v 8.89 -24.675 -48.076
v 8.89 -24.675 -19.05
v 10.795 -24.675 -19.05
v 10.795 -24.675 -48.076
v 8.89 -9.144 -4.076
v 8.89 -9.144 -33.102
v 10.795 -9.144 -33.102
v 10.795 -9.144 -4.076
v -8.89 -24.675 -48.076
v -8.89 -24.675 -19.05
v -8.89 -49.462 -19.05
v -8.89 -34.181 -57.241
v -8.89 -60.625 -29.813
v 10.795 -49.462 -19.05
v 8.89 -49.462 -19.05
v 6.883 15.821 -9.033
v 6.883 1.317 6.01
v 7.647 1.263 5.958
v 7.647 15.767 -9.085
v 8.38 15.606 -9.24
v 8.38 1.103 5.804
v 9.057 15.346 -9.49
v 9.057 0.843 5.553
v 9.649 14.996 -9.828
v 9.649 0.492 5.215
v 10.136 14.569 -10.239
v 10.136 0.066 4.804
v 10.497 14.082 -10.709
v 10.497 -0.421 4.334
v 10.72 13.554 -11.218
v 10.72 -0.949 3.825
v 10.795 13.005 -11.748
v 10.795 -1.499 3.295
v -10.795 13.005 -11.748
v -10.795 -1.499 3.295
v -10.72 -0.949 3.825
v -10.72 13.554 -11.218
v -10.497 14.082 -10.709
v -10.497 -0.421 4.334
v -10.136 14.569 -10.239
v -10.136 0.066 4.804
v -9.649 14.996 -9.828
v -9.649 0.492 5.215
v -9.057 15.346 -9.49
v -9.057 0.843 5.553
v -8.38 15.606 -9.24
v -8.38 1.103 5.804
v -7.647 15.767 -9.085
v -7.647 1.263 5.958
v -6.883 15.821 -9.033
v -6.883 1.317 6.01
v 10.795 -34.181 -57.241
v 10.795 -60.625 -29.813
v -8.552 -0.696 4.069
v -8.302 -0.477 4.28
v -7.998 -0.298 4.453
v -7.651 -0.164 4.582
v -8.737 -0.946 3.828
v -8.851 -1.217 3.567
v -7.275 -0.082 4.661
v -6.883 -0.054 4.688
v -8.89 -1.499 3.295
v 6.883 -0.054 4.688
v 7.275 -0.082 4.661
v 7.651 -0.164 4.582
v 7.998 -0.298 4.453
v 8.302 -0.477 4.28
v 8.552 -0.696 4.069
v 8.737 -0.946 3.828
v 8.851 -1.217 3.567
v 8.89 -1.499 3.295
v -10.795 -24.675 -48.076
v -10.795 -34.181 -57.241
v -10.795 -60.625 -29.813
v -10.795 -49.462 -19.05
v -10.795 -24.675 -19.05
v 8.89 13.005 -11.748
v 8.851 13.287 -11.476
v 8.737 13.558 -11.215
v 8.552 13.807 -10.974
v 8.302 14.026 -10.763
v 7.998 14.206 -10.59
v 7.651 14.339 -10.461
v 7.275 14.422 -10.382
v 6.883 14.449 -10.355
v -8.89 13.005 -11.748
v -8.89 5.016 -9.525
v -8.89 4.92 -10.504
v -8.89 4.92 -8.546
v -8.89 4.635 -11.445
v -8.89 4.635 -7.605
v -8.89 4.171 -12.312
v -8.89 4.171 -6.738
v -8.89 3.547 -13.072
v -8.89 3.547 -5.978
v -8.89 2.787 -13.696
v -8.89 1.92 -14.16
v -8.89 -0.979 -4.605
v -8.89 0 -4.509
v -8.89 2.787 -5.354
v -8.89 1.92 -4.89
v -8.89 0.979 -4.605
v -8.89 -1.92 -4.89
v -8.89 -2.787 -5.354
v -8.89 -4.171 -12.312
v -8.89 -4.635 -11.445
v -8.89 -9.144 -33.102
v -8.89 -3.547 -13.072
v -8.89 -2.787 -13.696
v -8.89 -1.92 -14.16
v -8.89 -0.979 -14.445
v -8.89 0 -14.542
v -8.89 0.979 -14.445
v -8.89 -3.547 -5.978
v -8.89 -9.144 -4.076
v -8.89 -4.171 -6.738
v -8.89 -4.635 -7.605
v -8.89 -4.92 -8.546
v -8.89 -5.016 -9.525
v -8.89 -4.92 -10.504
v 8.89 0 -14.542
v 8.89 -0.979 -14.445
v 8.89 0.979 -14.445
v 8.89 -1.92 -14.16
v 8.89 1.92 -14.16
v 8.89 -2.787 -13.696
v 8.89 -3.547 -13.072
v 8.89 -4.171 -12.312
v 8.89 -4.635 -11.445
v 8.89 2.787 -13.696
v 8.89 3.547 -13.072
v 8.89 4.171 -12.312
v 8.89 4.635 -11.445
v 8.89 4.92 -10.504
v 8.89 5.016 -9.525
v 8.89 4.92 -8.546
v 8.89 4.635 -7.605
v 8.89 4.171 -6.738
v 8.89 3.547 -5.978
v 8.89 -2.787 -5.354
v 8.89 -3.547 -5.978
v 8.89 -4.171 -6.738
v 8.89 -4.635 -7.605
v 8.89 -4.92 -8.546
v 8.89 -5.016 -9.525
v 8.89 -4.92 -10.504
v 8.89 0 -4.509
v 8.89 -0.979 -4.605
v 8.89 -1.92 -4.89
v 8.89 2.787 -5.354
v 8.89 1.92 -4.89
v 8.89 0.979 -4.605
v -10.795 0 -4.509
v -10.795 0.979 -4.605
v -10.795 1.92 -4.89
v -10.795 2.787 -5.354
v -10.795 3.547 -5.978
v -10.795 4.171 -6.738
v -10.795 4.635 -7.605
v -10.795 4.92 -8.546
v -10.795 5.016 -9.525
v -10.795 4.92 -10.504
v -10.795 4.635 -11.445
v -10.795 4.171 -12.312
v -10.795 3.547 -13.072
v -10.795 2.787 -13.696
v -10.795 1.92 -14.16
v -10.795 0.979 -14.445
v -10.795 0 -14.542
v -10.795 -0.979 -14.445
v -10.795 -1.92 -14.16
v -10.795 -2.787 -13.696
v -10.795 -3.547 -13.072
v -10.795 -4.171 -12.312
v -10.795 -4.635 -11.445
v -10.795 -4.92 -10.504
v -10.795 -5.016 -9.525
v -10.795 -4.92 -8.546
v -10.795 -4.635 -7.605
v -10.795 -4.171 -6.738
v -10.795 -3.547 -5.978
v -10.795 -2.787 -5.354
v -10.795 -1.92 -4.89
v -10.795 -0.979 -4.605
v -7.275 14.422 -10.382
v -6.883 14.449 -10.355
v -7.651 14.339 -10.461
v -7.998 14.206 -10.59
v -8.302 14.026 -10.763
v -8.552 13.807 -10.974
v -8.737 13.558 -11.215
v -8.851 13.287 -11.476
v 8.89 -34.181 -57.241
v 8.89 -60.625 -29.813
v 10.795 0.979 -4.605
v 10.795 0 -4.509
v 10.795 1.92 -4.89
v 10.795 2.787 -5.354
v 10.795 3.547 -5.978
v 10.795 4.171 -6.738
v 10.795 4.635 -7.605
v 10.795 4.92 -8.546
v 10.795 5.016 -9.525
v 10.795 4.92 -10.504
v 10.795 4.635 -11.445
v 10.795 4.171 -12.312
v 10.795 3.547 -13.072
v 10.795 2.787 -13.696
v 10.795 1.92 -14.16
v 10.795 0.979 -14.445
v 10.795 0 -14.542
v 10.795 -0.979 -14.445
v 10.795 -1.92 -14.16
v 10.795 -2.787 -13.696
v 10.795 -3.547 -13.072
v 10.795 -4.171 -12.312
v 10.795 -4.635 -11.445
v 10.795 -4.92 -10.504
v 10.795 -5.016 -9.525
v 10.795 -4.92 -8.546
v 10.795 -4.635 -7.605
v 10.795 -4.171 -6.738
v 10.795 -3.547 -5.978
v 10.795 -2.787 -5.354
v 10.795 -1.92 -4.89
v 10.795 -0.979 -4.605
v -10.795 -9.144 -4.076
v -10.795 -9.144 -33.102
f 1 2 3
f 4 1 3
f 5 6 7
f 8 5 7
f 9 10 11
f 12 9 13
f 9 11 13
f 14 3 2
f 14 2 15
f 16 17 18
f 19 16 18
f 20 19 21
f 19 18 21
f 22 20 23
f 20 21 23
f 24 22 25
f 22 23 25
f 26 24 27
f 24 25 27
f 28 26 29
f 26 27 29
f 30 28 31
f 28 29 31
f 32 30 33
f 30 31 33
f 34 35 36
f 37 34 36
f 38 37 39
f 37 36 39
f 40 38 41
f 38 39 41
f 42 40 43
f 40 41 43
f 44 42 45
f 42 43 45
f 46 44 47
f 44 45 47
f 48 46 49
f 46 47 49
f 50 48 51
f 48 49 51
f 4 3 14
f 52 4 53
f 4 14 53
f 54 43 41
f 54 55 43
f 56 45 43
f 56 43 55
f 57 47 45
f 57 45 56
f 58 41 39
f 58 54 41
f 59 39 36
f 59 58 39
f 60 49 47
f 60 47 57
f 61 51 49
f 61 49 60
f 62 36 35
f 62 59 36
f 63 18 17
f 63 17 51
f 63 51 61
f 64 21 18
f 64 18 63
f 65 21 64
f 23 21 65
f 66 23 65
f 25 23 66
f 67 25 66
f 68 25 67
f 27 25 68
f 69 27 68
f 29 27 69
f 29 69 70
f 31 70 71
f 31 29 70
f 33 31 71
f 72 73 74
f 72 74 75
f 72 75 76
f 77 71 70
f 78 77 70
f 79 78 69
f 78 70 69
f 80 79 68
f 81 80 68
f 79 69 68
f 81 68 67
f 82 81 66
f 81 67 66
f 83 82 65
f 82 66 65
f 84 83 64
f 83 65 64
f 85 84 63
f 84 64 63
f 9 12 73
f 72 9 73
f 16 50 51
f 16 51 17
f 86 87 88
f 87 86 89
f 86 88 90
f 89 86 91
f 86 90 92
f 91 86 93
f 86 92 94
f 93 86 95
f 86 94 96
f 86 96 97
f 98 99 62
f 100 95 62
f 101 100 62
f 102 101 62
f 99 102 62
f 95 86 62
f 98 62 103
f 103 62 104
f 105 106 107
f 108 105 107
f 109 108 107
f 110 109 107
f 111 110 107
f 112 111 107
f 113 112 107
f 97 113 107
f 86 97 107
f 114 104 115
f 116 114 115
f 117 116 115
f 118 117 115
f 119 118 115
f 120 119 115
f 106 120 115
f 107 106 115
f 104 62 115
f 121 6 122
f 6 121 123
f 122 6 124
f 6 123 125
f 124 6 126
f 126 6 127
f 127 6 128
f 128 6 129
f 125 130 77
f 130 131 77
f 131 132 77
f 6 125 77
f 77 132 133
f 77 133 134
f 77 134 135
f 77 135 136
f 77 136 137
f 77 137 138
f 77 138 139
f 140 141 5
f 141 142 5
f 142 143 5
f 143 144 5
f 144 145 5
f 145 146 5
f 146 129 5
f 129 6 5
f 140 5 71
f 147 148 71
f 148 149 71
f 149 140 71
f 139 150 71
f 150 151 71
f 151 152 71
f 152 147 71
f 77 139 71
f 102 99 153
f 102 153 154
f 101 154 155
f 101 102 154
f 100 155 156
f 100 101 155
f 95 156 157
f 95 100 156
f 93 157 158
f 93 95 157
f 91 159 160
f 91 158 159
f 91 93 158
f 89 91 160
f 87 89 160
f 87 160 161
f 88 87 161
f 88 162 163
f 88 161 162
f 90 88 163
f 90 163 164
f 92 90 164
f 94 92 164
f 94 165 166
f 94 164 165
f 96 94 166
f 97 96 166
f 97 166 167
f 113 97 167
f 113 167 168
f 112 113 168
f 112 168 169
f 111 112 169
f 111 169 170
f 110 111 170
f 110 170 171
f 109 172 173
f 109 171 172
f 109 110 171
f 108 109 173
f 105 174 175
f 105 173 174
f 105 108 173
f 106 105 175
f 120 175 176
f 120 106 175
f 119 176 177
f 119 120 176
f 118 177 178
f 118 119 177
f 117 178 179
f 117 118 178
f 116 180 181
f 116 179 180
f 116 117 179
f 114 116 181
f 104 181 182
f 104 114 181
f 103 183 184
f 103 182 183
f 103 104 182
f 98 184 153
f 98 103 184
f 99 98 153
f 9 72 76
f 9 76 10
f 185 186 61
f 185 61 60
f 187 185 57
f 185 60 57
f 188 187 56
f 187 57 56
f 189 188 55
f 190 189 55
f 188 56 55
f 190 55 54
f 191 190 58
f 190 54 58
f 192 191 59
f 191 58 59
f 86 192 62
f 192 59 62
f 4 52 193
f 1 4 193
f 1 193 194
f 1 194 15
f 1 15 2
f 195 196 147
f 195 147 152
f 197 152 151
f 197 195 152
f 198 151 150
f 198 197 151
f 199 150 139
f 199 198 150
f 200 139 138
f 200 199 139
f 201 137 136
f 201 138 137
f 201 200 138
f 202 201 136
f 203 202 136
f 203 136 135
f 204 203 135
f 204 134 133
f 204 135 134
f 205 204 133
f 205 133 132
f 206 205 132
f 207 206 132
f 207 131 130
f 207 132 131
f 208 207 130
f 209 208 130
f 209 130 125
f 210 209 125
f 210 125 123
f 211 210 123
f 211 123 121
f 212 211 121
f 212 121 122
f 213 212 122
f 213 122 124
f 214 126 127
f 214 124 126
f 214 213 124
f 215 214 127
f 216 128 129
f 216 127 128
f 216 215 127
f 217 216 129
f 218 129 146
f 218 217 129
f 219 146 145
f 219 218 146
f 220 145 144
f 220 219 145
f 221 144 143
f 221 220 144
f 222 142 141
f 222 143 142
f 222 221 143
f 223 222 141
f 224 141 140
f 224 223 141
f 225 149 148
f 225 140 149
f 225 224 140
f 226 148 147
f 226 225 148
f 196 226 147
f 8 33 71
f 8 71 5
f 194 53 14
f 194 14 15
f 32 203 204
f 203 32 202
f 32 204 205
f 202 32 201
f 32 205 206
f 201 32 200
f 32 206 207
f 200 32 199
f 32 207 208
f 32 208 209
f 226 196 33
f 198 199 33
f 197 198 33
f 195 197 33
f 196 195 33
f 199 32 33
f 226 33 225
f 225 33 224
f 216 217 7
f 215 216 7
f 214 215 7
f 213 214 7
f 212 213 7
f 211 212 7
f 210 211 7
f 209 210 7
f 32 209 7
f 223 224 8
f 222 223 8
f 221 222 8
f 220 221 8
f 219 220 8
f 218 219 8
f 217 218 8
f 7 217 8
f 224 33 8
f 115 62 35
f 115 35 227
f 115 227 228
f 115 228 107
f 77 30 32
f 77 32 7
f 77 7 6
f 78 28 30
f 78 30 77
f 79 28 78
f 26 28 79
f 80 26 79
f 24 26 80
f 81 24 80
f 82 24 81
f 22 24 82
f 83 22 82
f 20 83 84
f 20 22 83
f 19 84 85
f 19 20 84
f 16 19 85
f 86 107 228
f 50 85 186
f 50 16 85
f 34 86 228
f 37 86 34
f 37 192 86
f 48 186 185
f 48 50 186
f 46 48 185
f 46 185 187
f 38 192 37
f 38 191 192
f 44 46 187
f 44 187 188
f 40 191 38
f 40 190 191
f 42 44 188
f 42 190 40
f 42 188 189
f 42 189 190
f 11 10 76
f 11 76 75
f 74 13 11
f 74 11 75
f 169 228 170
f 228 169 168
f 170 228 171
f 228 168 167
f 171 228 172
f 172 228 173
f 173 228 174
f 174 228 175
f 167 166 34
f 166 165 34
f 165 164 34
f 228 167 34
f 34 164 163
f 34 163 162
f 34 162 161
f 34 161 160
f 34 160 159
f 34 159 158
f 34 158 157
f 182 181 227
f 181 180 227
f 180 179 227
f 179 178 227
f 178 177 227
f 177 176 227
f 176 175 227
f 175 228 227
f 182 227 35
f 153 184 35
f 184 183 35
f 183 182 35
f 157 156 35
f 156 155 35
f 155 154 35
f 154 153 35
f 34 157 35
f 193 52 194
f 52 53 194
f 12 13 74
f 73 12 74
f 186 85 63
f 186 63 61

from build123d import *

# Parameters (mm, degrees)
BASE_FLANGE1_DEPTH      = 19.05
CUT_EXTRUDE1_START      = -21.59
CUT_EXTRUDE1_DEPTH      = 21.59
CUT_EXTRUDE2_DEPTH      = 87.128405868
CUT_EXTRUDE2_DEPTH_BACK = 87.128405868
CUT_EXTRUDE3_DEPTH      = 86.670726753
CUT_EXTRUDE3_DEPTH_BACK = 86.670726753
SKETCH9_R               = 5.0165
CUT_EXTRUDE6_DEPTH      = 86.058030225
CUT_EXTRUDE6_DEPTH_BACK = 86.058030225
SKETCH10_W              = 21.59
SKETCH10_H              = 15.531347002


# Read off the part's stored shape, not the designer's step: Cut-Extrude1
# Sheet-metal steps are written as plain solids
with BuildPart() as part:
    # Sketch1 → Base-Flange1 (new, symmetric)
    with BuildSketch(Plane(origin=(0, -0.842343472, 1.363693041), x_dir=(1, 0, 0), z_dir=(0, -0.6940771264425077, 0.7199006476933545))):
        with BuildLine():
            Line((-10.795, -64.676760458), (-10.795, 0.868157815))
            ThreePointArc((-10.795, 0.868157815), (-9.649318885, 3.6340767), (-6.8834, 4.779757815))
            Line((-6.8834, 4.779757815), (6.8834, 4.779757815))
            ThreePointArc((6.8834, 4.779757815), (9.649318885, 3.6340767), (10.795, 0.868157815))
            Line((10.795, 0.868157815), (10.795, -64.676760458))
            Line((10.795, -64.676760458), (8.89, -64.676760458))
            Line((8.89, -64.676760458), (8.89, 0.868157815))
            ThreePointArc((8.89, 0.868157815), (8.302280467, 2.287038282), (6.8834, 2.874757815))
            Line((6.8834, 2.874757815), (-6.8834, 2.874757815))
            ThreePointArc((-6.8834, 2.874757815), (-8.302280467, 2.287038282), (-8.89, 0.868157815))
            Line((-8.89, 0.868157815), (-8.89, -64.676760458))
            Line((-8.89, -64.676760458), (-10.795, -64.676760458))
        make_face()
    extrude(amount=BASE_FLANGE1_DEPTH, both=True)

    # Cut-Extrude1 outline → Cut-Extrude1 (cut)
    with BuildSketch(Plane.ZY.offset(10.795).offset(CUT_EXTRUDE1_START)):
        Polygon((3.295278576, -1.498700046), (-19.05, -24.675347002), (-19.05, -49.462056695), (15.680368861, -13.439525358), (18.395320949, -10.623561984), (6.010230664, 1.317263328), align=None)
    extrude(amount=CUT_EXTRUDE1_DEPTH, mode=Mode.SUBTRACT)

    # Sketch7 → Cut-Extrude2 (cut, two sides: drawn at the far end of the back side and taken through both)
    with BuildSketch(Plane.ZY.offset(10.795).offset(-CUT_EXTRUDE2_DEPTH_BACK)):
        Polygon((11.882741933, -6.055059051), (9.429090908, -1.978959147), (12.655449119, -0.036819034), (15.109100144, -4.112918938), align=None)
    extrude(amount=CUT_EXTRUDE2_DEPTH + CUT_EXTRUDE2_DEPTH_BACK, mode=Mode.SUBTRACT)

    # Sketch9 → Cut-Extrude3 (cut, two sides: drawn at the far end of the back side and taken through both)
    with BuildSketch(Plane.ZY.offset(-8.89).offset(-CUT_EXTRUDE3_DEPTH_BACK)):
        with Locations((-9.525, 0)):
            Circle(SKETCH9_R)
    extrude(amount=CUT_EXTRUDE3_DEPTH + CUT_EXTRUDE3_DEPTH_BACK, mode=Mode.SUBTRACT)

    # Sketch10 → Cut-Extrude6 (cut, two sides: drawn at the far end of the back side and taken through both)
    with BuildSketch(Plane.XY.offset(1.435180439).offset(-CUT_EXTRUDE6_DEPTH_BACK)):
        with Locations((0, -16.909673501)):
            Rectangle(SKETCH10_W, SKETCH10_H)
    extrude(amount=CUT_EXTRUDE6_DEPTH + CUT_EXTRUDE6_DEPTH_BACK, mode=Mode.SUBTRACT)


with BuildPart() as cut_extrude6_piece_1:
    # of the separate pieces the step leaves, piece 1, a body of its own (cut_extrude6_pieces)
    add(part.part.solids().sort_by_distance((-10.795, -9.144, -33.102159972))[0])


with BuildPart() as cut_extrude6_piece_2:
    # of the separate pieces the step leaves, piece 2, a body of its own (cut_extrude6_pieces)
    add(part.part.solids().sort_by_distance((-10.795, -34.181015958, -57.241074344))[0])


with BuildPart() as cut_extrude6_piece_3:
    # of the separate pieces the step leaves, piece 3, a body of its own (cut_extrude6_pieces)
    add(part.part.solids().sort_by_distance((10.795, -24.675347002, -48.076382778))[0])


solid = Compound([cut_extrude6_piece_1.part, cut_extrude6_piece_2.part, cut_extrude6_piece_3.part])
